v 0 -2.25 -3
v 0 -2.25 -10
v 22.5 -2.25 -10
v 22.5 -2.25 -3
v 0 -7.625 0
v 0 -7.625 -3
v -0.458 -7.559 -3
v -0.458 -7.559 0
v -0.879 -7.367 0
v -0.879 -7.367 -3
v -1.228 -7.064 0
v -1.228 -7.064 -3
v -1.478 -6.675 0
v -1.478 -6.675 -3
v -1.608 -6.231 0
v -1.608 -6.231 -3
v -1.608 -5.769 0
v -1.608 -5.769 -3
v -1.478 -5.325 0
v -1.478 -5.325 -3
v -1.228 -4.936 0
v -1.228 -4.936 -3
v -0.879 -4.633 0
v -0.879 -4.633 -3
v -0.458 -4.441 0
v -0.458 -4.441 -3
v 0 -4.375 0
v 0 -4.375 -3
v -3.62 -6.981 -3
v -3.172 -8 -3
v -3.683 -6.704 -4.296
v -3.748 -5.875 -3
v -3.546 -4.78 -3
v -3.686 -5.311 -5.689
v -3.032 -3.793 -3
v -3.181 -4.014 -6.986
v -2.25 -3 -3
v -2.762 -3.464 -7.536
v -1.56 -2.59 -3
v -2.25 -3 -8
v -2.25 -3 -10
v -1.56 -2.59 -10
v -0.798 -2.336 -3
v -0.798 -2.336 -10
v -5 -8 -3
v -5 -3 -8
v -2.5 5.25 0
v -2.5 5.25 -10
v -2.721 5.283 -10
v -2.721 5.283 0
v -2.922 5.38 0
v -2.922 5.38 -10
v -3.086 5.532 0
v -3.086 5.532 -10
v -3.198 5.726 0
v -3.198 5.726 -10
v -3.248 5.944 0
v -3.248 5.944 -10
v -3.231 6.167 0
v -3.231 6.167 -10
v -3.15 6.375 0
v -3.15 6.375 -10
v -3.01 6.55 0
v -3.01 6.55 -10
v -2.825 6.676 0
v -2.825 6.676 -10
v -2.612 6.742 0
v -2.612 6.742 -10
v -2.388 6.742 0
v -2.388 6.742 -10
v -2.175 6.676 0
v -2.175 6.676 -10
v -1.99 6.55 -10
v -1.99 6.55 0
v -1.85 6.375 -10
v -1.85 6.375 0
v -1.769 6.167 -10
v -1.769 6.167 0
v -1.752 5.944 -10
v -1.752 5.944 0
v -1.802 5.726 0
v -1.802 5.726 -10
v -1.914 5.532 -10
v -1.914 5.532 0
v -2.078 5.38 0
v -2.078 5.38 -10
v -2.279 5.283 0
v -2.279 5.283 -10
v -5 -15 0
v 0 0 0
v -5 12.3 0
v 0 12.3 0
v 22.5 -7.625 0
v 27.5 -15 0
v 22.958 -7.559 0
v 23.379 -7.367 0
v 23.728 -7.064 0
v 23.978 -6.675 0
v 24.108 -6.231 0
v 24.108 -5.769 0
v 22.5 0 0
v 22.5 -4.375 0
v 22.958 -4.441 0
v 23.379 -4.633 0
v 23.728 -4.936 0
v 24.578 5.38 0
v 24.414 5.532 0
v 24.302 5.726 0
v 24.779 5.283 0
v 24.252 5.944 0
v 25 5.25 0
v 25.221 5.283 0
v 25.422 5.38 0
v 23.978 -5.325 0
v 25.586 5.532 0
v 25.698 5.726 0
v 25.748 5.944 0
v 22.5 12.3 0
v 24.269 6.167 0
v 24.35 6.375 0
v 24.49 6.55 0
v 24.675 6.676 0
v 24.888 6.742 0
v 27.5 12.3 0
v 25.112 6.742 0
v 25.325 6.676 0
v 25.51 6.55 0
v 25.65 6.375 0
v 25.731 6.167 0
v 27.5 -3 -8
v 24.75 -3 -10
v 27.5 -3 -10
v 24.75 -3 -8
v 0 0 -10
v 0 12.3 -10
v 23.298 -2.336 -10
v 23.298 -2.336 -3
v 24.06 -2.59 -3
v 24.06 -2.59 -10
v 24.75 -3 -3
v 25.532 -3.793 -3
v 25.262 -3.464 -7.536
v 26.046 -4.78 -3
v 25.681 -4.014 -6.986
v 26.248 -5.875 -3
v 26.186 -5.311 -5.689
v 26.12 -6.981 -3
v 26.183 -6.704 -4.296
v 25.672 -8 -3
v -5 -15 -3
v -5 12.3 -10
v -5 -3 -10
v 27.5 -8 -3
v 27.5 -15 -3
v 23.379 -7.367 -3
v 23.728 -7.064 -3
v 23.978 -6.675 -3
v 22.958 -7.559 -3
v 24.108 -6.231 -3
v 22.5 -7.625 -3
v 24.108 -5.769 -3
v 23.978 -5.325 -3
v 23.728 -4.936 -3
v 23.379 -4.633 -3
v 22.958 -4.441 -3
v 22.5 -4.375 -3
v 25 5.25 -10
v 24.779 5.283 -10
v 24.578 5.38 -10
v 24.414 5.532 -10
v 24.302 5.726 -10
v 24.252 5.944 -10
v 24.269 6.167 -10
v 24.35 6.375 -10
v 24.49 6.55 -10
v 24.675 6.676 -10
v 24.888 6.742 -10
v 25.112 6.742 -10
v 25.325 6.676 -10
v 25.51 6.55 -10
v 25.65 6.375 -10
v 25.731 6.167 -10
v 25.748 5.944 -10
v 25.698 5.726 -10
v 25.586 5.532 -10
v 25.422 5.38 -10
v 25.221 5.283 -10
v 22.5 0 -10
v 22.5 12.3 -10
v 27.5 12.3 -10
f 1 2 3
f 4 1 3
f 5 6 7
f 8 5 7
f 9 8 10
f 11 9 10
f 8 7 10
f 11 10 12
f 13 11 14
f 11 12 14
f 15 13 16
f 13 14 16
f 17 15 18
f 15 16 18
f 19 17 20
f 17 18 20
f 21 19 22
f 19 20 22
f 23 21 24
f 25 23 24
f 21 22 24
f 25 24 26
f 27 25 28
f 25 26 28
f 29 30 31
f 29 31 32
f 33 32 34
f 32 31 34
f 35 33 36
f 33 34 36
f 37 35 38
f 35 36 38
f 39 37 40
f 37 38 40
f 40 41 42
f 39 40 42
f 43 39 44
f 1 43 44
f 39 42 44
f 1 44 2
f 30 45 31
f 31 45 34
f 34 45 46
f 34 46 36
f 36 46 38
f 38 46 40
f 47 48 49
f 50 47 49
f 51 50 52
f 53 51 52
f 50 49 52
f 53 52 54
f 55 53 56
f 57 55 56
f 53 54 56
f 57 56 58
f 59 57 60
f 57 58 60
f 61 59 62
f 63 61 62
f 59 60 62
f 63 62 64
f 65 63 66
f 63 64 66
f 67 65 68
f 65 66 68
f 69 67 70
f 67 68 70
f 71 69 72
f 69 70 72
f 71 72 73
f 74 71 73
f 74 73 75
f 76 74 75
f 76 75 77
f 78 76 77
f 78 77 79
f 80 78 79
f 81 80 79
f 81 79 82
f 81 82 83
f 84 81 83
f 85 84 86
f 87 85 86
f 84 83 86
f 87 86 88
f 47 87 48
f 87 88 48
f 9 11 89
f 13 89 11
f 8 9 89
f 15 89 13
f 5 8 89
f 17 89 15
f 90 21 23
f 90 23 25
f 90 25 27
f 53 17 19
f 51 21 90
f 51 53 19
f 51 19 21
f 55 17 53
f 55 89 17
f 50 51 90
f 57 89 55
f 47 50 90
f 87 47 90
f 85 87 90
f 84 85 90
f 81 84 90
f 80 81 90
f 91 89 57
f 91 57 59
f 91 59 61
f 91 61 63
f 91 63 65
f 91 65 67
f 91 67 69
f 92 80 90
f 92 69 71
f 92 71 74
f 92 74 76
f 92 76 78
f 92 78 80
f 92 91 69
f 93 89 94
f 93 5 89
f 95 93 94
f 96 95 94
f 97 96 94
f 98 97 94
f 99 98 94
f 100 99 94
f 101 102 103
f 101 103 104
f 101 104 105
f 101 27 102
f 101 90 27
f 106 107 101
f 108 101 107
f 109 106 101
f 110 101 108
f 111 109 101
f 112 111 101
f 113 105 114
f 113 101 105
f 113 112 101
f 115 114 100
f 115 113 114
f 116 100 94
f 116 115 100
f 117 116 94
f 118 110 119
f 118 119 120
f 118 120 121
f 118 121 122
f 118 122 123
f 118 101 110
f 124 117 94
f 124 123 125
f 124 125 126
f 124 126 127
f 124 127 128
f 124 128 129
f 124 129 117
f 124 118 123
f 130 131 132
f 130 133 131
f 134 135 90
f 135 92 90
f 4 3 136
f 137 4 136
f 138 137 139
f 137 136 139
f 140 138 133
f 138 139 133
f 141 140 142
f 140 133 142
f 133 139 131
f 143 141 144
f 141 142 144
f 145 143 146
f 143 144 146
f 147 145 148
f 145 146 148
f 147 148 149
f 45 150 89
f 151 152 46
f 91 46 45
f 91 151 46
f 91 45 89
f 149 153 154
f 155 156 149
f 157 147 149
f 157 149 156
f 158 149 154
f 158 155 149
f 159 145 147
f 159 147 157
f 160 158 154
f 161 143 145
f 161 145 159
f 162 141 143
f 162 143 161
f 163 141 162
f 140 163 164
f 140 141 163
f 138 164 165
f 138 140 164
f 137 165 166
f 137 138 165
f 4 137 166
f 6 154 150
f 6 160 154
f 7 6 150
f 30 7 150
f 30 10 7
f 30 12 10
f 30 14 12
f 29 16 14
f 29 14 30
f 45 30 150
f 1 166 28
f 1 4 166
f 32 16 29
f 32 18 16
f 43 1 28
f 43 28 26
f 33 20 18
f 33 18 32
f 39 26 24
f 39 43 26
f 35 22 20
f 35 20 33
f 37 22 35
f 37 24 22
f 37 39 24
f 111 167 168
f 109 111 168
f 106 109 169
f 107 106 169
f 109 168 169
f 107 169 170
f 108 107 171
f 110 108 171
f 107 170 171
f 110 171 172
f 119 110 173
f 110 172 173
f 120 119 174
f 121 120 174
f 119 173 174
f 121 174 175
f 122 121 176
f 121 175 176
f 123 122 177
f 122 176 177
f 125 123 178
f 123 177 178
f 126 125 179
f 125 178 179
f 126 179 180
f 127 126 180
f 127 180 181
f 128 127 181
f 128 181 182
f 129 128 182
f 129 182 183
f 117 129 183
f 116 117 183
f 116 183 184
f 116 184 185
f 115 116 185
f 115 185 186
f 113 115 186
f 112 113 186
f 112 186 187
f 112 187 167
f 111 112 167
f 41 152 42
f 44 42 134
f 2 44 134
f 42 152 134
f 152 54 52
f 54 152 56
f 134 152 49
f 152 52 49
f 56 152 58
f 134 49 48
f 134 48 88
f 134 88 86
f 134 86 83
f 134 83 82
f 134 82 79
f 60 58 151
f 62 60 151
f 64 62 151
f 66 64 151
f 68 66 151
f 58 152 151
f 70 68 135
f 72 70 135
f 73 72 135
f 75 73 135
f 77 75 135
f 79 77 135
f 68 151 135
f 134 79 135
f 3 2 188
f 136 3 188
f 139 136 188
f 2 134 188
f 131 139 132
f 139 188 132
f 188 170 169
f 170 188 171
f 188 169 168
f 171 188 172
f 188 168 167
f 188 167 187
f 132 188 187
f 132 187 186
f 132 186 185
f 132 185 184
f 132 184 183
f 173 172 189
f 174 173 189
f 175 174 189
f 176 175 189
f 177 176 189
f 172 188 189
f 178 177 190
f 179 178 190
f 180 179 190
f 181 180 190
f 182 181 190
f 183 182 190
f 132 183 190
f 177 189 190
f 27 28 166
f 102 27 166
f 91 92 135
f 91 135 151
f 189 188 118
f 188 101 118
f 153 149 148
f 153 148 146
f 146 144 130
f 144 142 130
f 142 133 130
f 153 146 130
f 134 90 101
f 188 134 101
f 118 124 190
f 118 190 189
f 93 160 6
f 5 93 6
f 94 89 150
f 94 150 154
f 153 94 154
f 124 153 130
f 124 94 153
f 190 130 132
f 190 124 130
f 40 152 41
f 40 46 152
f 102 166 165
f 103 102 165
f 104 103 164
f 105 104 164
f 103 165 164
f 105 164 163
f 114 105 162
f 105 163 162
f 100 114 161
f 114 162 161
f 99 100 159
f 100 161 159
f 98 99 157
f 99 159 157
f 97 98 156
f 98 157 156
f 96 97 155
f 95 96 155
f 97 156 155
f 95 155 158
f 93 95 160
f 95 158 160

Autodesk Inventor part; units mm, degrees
ref_plane "YZ Plane" through (0, 0, 0) normal (1, 0, 0) x (0, 1, 0)
ref_plane "XZ Plane" through (0, 0, 0) normal (0, 1, 0) x (-1, 0, 0)
ref_plane "XY Plane" through (0, 0, 0) normal (0, 0, 1) x (1, 0, 0)
sketch "스케치1" plane through (0, 0, 0) normal (0, 0, 1) x (1, 0, 0)
  line L0 (0, 0) -> (22.5, 0)
  line L1 (22.5, 0) -> (22.5, 12.3)
  line L2 (0, 12.3) -> (0, 0)
  line L3 (-5, -3) -> (27.5, -3)
  line L4 (27.5, -3) -> (27.5, 12.3)
  line L5 (27.5, 12.3) -> (22.5, 12.3)
  line L6 (-5, 12.3) -> (-5, -3)
  line L7 (0, 12.3) -> (-5, 12.3)
  dimension "d0" = 22.5
  dimension "d1" = 12.3
  dimension "d2" = 32.5
extrude "돌출1" add sketch "스케치1" against normal blind 10
hole "구멍1" at (25, 6, 0) direction (0, 0, -1) diameter 1.5 depth 10 tip angle 118
hole "구멍2" at (-2.5, 6, 0) direction (0, 0, -1) diameter 1.5 depth 10 tip angle 118
sketch "스케치3" plane through (-5, -3, 0) normal (0, -1, 0) x (1, 0, 0)
  line L0 (32.5, 0) -> (32.5, -10) projected
  line L1 (0, 0) -> (32.5, 0)
  line L2 (32.5, 0) -> (32.5, -3)
  line L3 (32.5, -3) -> (0, -3)
  line L4 (0, -3) -> (0, 0)
  point P0 (5, 0)
  point P1 (32.5, -13)
  dimension "d34" = 3
extrude "돌출3" add sketch "스케치3" along normal blind 12
sketch "스케치4" plane through (27.5, -3, -3) normal (0, 0, -1) x (-1, 0, 0)
  line L0 (27.5, -3) -> (5, -3) construction
  line L1 (27.5, -1.375) -> (5, -1.375)
  line L2 (5, -4.625) -> (27.5, -4.625)
  arc A0 (27.5, -4.625) -> (27.5, -1.375) centre (27.5, -3) ccw
  arc A1 (5, -1.375) -> (5, -4.625) centre (5, -3) ccw
  point P0 (27.5, 3)
  point P1 (16.25, -3)
  dimension "d38" = 22.5
  dimension "d39" = 3.25
extrude "돌출4" cut sketch "스케치4" against normal through all
sketch "스케치5" plane through (0, 0, -10) normal (0, 0, -1) x (-1, 0, 0)
  arc A0 (-22.5, -4.375) -> (-22.5, -7.625) centre (-22.5, -6) ccw projected
  line L0 (-22.5, -4.375) -> (0, -4.375) projected
  line L1 (0, -7.625) -> (-22.5, -7.625) projected
  arc A1 (0, -7.625) -> (0, -4.375) centre (0, -6) ccw projected
  line L2 (-22.5, -6) -> (0, -6) construction
  line L3 (-22.5, -9.75) -> (0, -9.75)
  line L4 (0, -2.25) -> (-22.5, -2.25)
  arc A2 (-22.5, -2.25) -> (-22.5, -9.75) centre (-22.5, -6) ccw
  arc A3 (0, -9.75) -> (0, -2.25) centre (0, -6) ccw
  point P0 (0, 0)
  point P1 (-11.25, -6)
  dimension "d40" = 7.5
extrude "돌출5" cut sketch "스케치5" against normal up to surface (7 mm away) contours L0 A1 L1 A0 | A2 L4 A3 L3
chamfer "모따기1" distance 5 angle 45 2 edges at (-3.625, -3, -3) (26.125, -3, -3)
properties part number "servolock1"
